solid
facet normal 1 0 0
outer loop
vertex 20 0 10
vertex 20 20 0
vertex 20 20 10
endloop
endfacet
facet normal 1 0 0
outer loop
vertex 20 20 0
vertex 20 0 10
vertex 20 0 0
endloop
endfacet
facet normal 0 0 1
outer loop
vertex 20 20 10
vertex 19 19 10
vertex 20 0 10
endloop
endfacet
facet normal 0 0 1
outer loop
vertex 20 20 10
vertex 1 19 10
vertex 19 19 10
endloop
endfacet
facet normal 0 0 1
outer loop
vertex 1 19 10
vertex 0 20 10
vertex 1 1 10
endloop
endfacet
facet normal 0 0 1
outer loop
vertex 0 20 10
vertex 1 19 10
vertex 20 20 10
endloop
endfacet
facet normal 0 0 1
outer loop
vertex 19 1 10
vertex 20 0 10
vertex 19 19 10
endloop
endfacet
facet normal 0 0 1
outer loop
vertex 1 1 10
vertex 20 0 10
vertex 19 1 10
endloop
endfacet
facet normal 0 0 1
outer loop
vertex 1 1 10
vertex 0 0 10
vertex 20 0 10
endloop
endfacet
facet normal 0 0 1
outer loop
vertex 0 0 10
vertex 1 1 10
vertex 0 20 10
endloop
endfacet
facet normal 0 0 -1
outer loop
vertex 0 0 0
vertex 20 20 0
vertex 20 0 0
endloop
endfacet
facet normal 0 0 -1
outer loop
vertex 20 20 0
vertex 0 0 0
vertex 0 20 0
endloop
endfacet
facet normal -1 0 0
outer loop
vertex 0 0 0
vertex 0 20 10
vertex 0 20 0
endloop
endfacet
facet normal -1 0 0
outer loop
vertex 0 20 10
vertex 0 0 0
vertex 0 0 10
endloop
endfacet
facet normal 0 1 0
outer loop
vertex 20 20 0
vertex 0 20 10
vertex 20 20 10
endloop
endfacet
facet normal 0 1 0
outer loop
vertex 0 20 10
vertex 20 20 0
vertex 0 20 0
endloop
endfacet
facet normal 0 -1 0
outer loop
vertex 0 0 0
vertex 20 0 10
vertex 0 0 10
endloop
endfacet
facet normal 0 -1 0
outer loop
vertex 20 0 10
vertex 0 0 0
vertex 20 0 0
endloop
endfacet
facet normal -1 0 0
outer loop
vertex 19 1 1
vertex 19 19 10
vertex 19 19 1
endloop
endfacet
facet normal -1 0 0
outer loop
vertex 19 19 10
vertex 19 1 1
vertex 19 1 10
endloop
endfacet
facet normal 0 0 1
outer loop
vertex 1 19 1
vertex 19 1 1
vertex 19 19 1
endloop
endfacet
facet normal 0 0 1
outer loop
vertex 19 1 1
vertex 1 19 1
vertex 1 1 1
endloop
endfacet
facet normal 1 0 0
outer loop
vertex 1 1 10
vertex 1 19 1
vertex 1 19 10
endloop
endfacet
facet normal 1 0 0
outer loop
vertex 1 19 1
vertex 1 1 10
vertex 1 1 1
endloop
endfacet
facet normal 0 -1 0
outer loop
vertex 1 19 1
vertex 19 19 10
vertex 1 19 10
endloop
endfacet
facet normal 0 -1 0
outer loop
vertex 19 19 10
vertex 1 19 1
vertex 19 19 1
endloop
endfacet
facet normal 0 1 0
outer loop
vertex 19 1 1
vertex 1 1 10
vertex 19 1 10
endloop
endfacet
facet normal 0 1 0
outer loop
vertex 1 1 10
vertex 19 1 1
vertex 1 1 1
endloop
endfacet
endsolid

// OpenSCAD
part="body";
gap=0.18;
if(part=="body") difference(){cube([20,20,10]);translate([1,1,1])cube([18,18,10]);}
else if(part=="lid") translate([0,0,10+gap])cube([20,20,1]);
